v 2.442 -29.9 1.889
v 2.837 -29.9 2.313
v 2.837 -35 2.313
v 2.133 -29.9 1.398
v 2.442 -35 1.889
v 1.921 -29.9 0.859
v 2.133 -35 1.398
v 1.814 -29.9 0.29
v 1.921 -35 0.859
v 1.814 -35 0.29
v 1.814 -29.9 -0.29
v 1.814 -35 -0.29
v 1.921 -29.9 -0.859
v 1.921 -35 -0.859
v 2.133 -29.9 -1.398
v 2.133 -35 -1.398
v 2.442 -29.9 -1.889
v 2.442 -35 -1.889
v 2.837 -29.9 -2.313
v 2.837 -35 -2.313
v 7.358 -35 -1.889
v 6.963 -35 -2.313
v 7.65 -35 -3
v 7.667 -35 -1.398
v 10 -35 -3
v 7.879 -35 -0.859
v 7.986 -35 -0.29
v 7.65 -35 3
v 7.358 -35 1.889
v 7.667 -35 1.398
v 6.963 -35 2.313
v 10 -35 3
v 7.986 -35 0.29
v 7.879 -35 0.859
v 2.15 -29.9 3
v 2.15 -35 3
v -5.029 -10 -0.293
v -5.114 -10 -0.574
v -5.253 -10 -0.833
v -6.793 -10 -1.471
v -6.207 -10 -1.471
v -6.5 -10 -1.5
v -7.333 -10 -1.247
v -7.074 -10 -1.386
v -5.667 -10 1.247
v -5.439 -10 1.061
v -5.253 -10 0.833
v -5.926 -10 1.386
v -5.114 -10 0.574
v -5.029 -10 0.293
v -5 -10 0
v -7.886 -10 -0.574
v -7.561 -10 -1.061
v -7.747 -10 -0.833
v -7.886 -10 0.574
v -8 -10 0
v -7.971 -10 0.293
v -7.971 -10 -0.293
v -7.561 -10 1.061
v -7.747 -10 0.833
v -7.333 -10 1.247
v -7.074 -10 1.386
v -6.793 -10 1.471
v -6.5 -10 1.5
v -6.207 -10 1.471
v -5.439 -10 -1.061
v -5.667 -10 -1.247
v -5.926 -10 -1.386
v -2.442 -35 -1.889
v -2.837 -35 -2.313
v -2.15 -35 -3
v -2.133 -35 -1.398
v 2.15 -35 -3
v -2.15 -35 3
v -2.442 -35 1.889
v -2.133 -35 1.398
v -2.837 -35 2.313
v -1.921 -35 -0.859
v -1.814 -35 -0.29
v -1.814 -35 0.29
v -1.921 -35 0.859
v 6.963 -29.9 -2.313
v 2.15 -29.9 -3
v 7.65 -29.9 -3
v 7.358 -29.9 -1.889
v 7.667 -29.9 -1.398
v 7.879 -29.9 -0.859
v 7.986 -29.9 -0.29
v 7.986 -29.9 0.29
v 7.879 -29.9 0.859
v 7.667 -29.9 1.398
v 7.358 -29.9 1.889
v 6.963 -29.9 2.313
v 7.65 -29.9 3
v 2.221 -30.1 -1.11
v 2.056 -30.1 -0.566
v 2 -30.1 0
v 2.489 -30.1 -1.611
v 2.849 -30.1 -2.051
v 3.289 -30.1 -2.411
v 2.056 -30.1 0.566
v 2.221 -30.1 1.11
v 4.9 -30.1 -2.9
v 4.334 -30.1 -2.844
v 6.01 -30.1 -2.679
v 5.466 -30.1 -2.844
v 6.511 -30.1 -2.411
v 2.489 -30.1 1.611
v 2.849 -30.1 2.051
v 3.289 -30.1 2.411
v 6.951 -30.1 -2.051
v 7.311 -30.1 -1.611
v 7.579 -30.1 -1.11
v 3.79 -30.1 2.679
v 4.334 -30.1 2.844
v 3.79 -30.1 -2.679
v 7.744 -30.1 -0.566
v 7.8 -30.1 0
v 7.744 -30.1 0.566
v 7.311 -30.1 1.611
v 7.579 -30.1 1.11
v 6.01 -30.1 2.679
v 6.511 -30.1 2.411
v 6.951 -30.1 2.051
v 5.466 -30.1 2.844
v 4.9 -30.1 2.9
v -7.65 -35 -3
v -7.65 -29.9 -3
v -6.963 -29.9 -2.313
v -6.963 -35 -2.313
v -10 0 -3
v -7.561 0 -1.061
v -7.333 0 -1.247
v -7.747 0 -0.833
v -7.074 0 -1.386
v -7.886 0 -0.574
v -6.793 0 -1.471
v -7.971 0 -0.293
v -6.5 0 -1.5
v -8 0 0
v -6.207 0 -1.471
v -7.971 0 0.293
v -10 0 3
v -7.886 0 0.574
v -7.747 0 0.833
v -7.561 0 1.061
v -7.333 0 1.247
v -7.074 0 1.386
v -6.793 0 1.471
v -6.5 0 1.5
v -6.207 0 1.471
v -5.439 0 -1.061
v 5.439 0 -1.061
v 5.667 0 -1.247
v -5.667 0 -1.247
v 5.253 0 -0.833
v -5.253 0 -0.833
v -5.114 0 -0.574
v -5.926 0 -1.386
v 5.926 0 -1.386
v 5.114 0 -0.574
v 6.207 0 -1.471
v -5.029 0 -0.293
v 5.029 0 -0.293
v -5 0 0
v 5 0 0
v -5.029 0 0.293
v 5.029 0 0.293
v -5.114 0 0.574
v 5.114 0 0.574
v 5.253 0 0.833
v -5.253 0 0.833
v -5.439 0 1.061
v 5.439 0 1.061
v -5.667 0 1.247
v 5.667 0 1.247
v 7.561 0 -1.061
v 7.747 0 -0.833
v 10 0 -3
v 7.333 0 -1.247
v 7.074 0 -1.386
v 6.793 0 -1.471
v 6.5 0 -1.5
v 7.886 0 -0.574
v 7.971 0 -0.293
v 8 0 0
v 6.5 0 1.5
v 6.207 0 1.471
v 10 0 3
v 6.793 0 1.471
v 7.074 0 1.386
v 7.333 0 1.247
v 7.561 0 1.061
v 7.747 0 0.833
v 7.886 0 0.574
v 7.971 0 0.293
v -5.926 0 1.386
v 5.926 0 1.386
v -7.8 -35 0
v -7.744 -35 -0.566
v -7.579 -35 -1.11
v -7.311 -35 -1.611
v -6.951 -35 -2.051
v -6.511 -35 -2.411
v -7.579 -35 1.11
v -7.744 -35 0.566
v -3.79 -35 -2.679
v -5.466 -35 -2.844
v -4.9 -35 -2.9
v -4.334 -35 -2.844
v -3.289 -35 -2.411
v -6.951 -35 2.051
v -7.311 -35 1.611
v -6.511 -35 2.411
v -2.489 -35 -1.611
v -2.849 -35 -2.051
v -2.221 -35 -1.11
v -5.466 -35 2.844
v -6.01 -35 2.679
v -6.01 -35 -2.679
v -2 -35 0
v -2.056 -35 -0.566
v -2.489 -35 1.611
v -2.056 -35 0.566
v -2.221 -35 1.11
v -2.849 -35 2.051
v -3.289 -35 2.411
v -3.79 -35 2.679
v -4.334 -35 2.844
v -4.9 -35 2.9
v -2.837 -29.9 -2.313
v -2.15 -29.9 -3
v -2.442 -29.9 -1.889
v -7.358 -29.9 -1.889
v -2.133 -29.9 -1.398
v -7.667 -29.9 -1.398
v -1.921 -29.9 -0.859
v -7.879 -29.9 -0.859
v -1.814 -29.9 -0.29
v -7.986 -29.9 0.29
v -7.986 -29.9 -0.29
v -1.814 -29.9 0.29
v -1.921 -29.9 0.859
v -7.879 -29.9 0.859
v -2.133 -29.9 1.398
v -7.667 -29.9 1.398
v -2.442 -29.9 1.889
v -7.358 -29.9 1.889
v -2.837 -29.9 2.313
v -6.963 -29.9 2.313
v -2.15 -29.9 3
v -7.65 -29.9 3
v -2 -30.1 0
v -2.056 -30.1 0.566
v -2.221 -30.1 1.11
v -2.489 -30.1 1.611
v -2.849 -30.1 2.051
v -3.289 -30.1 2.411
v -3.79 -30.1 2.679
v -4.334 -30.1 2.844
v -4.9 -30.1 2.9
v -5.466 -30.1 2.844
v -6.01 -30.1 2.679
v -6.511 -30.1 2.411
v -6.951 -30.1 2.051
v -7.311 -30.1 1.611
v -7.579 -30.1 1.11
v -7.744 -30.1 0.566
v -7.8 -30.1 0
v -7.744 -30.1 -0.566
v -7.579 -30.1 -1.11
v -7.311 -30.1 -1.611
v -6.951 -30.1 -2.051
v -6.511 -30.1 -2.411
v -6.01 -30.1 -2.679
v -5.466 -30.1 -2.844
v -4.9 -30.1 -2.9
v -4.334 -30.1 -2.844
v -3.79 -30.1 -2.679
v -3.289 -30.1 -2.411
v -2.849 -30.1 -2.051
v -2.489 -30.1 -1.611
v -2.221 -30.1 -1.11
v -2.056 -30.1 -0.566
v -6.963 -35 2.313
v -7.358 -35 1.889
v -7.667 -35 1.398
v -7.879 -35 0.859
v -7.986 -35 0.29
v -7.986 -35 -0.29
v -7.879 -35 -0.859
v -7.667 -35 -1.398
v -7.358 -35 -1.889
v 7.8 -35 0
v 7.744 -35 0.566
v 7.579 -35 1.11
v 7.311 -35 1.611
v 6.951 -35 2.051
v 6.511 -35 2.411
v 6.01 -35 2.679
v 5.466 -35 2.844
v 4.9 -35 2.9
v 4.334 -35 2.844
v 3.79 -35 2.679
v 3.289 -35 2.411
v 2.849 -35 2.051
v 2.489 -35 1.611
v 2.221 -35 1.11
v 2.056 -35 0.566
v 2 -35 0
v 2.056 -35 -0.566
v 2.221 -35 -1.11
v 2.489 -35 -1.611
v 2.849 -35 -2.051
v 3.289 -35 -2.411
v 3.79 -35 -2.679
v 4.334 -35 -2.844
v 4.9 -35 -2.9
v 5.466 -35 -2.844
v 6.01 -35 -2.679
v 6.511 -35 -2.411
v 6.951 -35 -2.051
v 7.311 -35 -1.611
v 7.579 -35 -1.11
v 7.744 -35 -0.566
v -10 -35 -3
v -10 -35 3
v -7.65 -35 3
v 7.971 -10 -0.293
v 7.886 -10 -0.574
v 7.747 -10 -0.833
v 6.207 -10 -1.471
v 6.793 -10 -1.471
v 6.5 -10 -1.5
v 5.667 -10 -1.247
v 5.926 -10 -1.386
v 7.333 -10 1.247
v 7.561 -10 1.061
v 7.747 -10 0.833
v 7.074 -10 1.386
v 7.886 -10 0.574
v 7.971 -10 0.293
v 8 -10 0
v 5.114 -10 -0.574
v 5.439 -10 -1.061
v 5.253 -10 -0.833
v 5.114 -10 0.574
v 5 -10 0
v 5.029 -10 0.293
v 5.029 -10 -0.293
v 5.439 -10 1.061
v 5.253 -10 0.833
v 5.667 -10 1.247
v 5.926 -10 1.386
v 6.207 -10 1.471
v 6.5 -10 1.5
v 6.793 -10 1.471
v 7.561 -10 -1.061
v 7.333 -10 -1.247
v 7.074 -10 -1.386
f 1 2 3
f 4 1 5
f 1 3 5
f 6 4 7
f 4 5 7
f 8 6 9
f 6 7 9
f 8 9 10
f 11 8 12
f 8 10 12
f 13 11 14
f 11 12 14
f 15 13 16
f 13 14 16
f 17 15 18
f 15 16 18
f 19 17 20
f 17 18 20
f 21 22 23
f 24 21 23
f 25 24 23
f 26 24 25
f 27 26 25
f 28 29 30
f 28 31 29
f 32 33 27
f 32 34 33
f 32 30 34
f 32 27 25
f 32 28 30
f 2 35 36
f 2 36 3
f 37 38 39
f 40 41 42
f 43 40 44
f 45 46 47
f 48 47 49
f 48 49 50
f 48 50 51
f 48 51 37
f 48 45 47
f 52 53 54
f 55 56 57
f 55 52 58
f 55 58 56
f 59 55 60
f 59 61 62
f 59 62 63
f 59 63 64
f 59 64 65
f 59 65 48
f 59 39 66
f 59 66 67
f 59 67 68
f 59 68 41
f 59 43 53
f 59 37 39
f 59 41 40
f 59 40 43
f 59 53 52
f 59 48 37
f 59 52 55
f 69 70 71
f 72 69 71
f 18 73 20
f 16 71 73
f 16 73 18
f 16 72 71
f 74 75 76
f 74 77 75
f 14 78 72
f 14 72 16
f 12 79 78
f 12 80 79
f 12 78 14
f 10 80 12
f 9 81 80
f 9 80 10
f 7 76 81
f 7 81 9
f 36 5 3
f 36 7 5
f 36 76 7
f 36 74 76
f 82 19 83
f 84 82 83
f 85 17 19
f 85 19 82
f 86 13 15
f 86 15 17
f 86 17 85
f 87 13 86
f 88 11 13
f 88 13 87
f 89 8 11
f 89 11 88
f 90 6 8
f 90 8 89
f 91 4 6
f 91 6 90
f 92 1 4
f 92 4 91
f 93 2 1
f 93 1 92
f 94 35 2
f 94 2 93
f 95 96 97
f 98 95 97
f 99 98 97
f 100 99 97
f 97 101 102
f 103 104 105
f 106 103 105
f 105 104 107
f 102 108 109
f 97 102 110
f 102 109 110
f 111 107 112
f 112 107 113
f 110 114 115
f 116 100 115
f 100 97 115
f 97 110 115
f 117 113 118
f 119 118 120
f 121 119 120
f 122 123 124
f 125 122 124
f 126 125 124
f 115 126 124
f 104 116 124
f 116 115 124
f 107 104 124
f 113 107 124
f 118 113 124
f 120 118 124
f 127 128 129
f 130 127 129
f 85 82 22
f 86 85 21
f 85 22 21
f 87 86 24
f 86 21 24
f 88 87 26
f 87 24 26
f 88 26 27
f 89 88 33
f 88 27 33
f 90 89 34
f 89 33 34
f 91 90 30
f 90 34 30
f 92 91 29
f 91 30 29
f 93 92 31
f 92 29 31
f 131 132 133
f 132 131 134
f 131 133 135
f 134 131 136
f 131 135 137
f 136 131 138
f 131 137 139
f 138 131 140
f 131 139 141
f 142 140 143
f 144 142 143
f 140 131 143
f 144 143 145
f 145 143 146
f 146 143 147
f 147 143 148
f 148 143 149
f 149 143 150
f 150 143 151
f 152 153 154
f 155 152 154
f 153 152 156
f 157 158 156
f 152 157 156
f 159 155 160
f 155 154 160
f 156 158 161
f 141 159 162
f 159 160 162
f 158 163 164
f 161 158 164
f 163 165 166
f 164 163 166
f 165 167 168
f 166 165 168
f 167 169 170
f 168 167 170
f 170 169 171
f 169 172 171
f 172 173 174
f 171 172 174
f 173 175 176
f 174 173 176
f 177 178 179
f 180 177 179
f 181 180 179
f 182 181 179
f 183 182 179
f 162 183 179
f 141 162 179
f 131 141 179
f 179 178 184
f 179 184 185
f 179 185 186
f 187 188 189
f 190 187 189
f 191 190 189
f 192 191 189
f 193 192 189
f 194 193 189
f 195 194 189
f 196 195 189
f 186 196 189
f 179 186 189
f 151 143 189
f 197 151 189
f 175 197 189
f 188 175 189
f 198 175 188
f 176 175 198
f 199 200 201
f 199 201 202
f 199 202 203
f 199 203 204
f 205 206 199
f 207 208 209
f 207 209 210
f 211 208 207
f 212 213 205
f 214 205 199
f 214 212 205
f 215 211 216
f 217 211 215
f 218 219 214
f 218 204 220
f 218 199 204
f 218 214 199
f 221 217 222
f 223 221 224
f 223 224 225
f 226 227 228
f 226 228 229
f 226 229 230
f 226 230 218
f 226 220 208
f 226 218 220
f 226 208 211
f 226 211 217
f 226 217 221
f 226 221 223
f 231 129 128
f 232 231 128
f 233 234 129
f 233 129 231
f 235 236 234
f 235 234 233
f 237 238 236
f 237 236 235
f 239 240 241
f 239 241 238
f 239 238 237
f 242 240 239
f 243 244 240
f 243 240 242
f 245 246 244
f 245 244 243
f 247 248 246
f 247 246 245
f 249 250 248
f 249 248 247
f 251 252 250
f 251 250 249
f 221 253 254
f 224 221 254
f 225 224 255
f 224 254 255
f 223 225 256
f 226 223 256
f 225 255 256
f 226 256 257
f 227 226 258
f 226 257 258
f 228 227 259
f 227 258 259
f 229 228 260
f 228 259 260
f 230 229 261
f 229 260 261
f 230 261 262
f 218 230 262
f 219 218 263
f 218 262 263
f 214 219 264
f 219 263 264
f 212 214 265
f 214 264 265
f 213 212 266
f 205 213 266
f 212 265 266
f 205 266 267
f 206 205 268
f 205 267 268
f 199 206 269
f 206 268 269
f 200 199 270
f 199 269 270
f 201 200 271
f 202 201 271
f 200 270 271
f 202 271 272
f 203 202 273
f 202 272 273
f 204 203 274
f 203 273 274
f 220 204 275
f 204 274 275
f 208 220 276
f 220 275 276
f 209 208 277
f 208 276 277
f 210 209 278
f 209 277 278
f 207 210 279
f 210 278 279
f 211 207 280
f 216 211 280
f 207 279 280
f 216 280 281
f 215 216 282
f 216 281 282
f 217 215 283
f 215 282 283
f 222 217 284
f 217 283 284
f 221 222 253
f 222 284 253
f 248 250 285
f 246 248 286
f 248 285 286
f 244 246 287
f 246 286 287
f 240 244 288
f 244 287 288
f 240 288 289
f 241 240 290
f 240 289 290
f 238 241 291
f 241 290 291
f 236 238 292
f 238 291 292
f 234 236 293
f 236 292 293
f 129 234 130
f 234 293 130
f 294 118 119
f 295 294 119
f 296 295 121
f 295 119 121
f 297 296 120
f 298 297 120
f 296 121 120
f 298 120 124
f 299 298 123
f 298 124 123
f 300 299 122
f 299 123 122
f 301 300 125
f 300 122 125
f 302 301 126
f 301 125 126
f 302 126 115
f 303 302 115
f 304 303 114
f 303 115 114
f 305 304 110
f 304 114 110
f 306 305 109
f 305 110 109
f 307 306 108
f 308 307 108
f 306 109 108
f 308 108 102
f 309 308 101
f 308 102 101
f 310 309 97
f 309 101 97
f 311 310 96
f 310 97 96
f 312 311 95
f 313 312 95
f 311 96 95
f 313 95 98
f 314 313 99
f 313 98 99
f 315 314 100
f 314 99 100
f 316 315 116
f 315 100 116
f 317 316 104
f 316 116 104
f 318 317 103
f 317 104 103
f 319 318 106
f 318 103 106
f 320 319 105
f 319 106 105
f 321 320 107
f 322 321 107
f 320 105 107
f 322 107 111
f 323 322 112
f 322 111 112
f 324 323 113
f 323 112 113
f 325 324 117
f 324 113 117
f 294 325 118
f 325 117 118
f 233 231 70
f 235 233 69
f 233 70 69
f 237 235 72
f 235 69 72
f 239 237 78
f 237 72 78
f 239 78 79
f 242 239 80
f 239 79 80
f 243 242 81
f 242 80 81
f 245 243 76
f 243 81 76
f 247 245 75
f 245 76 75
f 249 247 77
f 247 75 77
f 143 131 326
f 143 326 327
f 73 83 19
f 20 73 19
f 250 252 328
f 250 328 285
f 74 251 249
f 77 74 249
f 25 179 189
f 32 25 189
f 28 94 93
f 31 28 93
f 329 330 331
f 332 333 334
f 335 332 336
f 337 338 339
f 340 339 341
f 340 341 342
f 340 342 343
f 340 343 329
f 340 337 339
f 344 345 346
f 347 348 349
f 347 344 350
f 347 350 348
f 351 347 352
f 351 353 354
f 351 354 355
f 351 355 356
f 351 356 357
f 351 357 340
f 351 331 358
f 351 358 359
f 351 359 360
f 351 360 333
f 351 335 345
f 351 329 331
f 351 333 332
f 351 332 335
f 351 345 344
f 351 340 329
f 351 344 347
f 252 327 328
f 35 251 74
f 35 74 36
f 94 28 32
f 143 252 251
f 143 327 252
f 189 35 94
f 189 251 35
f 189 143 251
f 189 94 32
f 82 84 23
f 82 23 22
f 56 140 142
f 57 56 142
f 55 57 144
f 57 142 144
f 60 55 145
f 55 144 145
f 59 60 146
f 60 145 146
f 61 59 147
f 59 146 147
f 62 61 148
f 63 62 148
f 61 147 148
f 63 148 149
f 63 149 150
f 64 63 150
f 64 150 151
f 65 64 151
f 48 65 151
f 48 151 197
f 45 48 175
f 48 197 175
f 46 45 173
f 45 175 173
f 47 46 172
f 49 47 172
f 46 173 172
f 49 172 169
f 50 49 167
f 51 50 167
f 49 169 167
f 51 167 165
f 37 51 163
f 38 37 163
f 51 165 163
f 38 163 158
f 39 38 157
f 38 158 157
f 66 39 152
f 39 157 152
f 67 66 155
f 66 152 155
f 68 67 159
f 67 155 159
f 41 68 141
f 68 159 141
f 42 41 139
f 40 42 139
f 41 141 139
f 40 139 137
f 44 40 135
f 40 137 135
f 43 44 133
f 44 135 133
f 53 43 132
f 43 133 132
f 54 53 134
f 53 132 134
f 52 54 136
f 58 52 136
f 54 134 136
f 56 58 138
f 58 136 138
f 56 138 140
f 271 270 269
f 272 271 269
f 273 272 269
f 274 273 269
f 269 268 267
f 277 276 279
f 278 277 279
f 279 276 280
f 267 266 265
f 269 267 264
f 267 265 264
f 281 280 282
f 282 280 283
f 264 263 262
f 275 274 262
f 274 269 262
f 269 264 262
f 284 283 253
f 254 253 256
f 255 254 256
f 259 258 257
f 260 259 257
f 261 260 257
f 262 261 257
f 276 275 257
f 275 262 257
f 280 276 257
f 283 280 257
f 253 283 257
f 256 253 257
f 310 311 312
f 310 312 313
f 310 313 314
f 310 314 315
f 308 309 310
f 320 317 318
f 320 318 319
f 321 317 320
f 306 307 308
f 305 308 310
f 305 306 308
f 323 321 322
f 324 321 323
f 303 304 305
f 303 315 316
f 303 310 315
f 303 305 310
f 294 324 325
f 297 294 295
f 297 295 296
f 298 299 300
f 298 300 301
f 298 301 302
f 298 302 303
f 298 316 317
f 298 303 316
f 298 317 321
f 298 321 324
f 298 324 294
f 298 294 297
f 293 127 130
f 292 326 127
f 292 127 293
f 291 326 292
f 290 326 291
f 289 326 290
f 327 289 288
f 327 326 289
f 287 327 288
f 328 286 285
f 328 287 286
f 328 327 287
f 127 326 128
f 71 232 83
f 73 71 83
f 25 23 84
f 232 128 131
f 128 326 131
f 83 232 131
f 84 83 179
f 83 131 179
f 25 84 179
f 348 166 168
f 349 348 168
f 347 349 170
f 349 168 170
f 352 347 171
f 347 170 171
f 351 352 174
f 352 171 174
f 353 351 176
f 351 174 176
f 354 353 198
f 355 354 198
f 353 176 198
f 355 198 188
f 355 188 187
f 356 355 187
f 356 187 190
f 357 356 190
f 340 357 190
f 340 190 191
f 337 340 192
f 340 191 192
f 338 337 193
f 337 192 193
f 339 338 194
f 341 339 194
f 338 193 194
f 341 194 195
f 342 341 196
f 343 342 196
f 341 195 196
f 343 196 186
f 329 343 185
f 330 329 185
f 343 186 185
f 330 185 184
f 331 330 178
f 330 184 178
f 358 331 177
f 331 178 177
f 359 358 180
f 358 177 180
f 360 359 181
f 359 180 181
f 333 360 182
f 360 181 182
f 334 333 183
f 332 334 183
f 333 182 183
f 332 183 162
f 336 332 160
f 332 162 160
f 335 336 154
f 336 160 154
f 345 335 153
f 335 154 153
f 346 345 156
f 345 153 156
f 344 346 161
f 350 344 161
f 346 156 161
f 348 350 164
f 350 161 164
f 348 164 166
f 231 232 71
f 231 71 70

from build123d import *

# Parameters (mm, degrees)
F0_W        = 20
F0_H        = 6
F1_DEPTH    = 35
F3_DEPTH    = 5.1
F4_T1_DEPTH = 7.671682988
F7_R        = 2.9
F8_DEPTH    = 4.9
F5_R        = 1.5
F9_DEPTH    = 10


# Not quite as in the source:
# - a fillet or chamfer that OpenCascade refuses, or shapes differently, is made with other operations: its cross-section is extruded or revolved along the edge and cut away or added


with BuildPart() as f1:
    # F0 (on Front) → F1 (new body)
    with BuildSketch(Plane.XZ):
        Rectangle(F0_W, F0_H)
    extrude(amount=F1_DEPTH)

    # F2 (on face) → F3 (cut)
    with BuildSketch(Plane.XZ.offset(35)):
        with BuildLine():
            Line((-6.65, 3.1), (-6.65, 2.5588083164))
            ThreePointArc((-6.65, 2.5588083164), (-8, 0), (-6.65, -2.5588083164))
            Line((-6.65, -2.5588083164), (-6.65, -3.1))
            Line((-6.65, -3.1), (-3.15, -3.1))
            Line((-3.15, -3.1), (-3.15, -2.5588083164))
            ThreePointArc((-3.15, -2.5588083164), (-1.8, 0), (-3.15, 2.5588083164))
            Line((-3.15, 2.5588083164), (-3.15, 3.1))
            Line((-3.15, 3.1), (-6.65, 3.1))
        make_face()
        with BuildLine():
            Line((6.65, -3.1), (6.65, -2.5588083164))
            ThreePointArc((6.65, -2.5588083164), (8, 0), (6.65, 2.5588083164))
            Line((6.65, 2.5588083164), (6.65, 3.1))
            Line((6.65, 3.1), (3.15, 3.1))
            Line((3.15, 3.1), (3.15, 2.5588083164))
            ThreePointArc((3.15, 2.5588083164), (1.8, 0), (3.15, -2.5588083164))
            Line((3.15, -2.5588083164), (3.15, -3.1))
            Line((3.15, -3.1), (6.65, -3.1))
        make_face()
    extrude(amount=-F3_DEPTH, mode=Mode.SUBTRACT)

    # F4: chamfer of 1 on 8 edges, made by hand

    # F4_s2 → F4_t1 (cut)
    with BuildSketch(Plane.XZ.offset(29.9)):
        Polygon((-7.65, 3), (-6.65, 2), (-6.65, 3), align=None)
        Polygon((-2.15, 3), (-3.15, 2), (-3.15, 3), align=None)
        Polygon((2.15, 3), (3.15, 2), (3.15, 3), align=None)
        Polygon((7.65, 3), (6.65, 2), (6.65, 3), align=None)
        Polygon((-7.65, -3), (-6.65, -2), (-6.65, -3), align=None)
        Polygon((-2.15, -3), (-3.15, -2), (-3.15, -3), align=None)
        Polygon((2.15, -3), (3.15, -2), (3.15, -3), align=None)
        Polygon((7.65, -3), (6.65, -2), (6.65, -3), align=None)
    extrude(amount=F4_T1_DEPTH, mode=Mode.SUBTRACT)

    # F5 (on face) → F9 (cut)
    with BuildSketch(Plane(origin=(0, 0, 0), x_dir=(-1, 0, 0), z_dir=(0, 1, 0))):
        with Locations((-6.5, 0)):
            Circle(F5_R)
        with Locations((6.5, 0)):
            Circle(F5_R)
    extrude(amount=-F9_DEPTH, mode=Mode.SUBTRACT)


with BuildPart() as f8:
    # F7 (on offset) → F8 (new body)
    with BuildSketch(Plane.XZ.offset(30.1)):
        with Locations((-4.9, 0)):
            Circle(F7_R)
    extrude(amount=F8_DEPTH)


with BuildPart() as f8b:
    # F7 (on offset) → F8, piece 2 (new body)
    with BuildSketch(Plane.XZ.offset(30.1)):
        with Locations((4.9, 0)):
            Circle(F7_R)
    extrude(amount=F8_DEPTH)


solid = Compound([f1.part, f8.part, f8b.part])
